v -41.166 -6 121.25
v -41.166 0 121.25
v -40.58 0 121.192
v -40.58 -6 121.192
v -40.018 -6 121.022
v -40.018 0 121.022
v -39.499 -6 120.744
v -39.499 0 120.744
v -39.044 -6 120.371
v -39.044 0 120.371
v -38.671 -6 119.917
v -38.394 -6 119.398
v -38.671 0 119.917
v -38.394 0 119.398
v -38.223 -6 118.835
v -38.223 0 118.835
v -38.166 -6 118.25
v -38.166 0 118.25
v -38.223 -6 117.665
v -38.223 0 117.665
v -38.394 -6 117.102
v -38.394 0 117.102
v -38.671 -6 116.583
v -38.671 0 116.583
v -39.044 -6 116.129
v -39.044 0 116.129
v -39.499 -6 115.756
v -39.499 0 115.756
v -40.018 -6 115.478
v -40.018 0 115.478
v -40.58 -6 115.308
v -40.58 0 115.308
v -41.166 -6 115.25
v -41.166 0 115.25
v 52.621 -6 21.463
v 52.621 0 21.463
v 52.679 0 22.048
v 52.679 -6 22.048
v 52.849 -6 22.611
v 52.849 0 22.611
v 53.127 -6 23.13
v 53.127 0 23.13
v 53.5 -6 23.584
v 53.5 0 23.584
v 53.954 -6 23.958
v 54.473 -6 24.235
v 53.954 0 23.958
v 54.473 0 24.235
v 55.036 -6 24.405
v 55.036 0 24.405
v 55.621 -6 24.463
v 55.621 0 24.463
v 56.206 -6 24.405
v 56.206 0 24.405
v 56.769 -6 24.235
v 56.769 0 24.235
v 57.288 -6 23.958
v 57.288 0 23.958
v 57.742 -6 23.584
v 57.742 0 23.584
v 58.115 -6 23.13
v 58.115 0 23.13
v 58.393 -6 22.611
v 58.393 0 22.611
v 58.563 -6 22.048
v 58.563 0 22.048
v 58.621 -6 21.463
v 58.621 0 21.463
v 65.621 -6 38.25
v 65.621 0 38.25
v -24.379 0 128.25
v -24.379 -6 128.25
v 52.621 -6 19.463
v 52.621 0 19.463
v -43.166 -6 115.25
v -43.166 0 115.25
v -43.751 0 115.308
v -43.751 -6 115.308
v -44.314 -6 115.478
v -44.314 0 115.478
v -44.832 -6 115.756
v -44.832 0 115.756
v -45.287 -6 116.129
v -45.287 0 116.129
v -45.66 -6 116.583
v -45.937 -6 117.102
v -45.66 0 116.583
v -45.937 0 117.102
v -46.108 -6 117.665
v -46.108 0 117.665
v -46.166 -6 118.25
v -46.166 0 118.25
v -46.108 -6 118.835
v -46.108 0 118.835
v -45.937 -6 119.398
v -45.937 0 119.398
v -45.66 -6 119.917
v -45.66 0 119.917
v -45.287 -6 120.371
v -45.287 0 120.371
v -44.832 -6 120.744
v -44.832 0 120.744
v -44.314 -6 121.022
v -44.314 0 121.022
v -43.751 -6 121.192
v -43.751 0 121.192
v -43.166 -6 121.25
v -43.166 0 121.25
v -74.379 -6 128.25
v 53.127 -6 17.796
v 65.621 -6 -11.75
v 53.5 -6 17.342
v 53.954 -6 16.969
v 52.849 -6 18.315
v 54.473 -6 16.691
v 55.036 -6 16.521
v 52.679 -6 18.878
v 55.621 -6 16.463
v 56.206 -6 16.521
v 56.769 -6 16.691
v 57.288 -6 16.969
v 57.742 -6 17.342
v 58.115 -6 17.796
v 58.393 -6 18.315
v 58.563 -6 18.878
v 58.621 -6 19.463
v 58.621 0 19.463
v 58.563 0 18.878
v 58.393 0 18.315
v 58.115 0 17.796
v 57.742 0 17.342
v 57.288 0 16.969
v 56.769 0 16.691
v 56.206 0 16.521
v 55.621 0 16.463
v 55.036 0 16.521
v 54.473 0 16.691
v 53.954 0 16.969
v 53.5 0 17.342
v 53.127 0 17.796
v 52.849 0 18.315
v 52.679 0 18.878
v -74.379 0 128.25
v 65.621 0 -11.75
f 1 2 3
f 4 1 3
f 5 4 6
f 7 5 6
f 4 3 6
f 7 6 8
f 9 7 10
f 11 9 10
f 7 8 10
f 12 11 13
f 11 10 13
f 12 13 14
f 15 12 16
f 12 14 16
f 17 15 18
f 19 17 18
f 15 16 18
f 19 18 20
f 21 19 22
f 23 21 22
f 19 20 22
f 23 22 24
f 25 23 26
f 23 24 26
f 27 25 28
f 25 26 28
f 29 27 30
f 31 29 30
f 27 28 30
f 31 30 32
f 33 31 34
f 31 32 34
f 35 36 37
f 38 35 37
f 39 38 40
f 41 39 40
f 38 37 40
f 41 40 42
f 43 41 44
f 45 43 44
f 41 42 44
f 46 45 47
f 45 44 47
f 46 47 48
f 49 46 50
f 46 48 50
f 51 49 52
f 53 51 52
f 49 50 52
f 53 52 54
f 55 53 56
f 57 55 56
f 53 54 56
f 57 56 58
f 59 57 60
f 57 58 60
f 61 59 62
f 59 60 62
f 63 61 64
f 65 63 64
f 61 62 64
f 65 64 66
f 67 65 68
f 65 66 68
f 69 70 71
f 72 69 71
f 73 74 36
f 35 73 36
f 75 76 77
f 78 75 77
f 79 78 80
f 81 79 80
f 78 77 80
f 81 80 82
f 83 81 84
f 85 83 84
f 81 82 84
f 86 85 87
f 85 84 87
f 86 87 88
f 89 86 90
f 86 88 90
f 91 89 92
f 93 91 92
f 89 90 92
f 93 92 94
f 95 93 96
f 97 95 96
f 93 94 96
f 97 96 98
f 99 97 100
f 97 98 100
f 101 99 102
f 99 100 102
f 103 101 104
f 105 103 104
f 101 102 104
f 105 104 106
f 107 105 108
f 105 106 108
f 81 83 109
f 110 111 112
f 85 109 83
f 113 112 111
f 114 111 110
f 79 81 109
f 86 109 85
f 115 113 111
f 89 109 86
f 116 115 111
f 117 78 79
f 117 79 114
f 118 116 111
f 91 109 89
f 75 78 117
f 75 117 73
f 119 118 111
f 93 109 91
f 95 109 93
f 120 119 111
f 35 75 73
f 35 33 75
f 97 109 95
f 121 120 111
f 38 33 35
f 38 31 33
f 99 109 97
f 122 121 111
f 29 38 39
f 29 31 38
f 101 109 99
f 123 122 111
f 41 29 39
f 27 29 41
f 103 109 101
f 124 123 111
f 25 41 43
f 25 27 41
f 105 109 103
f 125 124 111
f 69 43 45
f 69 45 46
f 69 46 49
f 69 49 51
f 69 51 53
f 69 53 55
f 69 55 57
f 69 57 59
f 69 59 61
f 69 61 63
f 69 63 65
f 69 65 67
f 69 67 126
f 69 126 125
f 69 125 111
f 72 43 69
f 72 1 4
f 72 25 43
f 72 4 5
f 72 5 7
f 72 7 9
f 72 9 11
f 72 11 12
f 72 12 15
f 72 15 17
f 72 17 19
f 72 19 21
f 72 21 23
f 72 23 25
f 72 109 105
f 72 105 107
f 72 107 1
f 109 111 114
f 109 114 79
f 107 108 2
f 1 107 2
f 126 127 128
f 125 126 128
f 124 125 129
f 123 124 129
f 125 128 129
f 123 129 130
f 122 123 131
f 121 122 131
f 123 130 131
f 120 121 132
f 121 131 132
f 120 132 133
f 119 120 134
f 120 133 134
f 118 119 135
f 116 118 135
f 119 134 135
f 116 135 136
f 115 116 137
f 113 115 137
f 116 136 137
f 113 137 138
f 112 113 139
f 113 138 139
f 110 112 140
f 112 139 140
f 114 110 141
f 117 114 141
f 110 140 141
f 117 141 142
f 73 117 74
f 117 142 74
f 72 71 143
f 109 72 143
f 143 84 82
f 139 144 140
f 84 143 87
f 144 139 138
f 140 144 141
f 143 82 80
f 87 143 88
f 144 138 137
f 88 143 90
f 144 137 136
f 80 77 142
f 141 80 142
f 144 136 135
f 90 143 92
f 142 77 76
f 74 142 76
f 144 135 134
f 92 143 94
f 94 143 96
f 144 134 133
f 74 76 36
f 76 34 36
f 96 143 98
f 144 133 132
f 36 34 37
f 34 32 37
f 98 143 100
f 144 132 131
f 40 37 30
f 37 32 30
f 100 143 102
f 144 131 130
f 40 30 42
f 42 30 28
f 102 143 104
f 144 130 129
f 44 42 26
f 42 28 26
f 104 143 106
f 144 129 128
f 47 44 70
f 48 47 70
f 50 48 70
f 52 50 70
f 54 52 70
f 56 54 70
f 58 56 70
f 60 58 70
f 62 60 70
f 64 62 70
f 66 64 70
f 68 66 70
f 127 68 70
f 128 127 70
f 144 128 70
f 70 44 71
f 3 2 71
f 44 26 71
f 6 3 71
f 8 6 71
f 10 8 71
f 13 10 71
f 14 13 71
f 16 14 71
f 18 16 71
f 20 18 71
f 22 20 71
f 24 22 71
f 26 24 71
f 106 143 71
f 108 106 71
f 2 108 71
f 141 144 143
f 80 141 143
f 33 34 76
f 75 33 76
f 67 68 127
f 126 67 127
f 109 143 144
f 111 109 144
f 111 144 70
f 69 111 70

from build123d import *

# Parameters (mm, degrees)
F1_DEPTH = 6


with BuildPart() as f1:
    # F0 (on Front) → F1 (new body)
    with BuildSketch(Plane.XZ):
        Polygon((65.621033, -11.750089), (65.621033, 38.249911), (-24.378967, 128.249911), (-74.378967, 128.249911), align=None)
        with BuildLine():
            ThreePointArc((52.621032, 21.463115), (55.621032, 24.463115), (58.621032, 21.463115))
            Line((58.621032, 21.463115), (58.621032, 19.463115))
            ThreePointArc((58.621032, 19.463115), (55.621032, 16.463115), (52.621032, 19.463115))
            Line((52.621032, 19.463115), (52.621032, 21.463115))
        make_face(mode=Mode.SUBTRACT)
        with BuildLine():
            Line((-41.165764, 115.249911), (-43.165764, 115.249911))
            ThreePointArc((-43.165764, 115.249911), (-46.165764, 118.249911), (-43.165764, 121.249911))
            Line((-43.165764, 121.249911), (-41.165764, 121.249911))
            ThreePointArc((-41.165764, 121.249911), (-38.165764, 118.249911), (-41.165764, 115.249911))
        make_face(mode=Mode.SUBTRACT)
    extrude(amount=F1_DEPTH)


solid = f1.part
